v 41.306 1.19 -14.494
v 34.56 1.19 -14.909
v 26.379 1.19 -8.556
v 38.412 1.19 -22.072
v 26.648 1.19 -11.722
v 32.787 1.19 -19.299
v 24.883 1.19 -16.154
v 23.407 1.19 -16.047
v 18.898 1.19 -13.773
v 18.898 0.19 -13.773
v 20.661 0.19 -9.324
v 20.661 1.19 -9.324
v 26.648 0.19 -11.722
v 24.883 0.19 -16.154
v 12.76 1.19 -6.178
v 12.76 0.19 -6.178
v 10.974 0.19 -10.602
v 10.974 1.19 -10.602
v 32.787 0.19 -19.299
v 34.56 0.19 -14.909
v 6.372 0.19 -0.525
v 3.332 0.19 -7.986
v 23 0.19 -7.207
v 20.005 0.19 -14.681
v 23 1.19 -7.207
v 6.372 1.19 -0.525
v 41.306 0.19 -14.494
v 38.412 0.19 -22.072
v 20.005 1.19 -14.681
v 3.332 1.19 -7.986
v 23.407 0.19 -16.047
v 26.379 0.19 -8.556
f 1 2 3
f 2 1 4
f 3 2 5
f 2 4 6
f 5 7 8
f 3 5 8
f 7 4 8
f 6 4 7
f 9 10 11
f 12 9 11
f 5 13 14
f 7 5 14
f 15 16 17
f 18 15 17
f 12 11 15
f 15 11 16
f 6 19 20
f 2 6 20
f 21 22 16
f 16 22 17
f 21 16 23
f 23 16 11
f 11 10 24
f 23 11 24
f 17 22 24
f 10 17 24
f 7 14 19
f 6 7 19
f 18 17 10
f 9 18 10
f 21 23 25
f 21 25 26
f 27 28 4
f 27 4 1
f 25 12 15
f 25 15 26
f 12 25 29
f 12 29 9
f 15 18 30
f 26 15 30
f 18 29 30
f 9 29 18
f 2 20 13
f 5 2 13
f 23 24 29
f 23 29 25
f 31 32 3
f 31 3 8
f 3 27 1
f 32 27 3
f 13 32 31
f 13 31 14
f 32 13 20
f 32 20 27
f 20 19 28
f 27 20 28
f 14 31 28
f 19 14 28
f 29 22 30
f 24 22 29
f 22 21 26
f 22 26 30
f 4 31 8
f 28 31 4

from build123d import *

# Parameters (mm, degrees)
SKETCH1_R           = 1.281558591
SKETCH1_R_2         = 1.27912149
BOSS_EXTRUDE1_DEPTH = 1.19
CUT_EXTRUDE1_DEPTH  = 2.54
CUT_EXTRUDE2_DEPTH  = 9.906


with BuildPart() as part:
    # Sketch1 → Boss-Extrude1 (new body)
    with BuildSketch(Plane(origin=(0, 0, 0), x_dir=(1, 0, 0), z_dir=(0, 1, 0))):
        with BuildLine():
            Line((-3.948168159, 25.857752235), (34.708440024, 30.372559307))
            add(Edge.make_bspline(
                [(34.708440024, 30.372559307), (34.942308086, 29.862573914), (35.216465801, 29.369202379), (35.41004421, 28.842603127), (35.634944676, 28.230797202), (35.768879722, 27.589205916), (35.960617271, 26.966210393), (35.965938184, 26.948921629), (35.991057299, 26.944232956), (35.999261802, 26.928111554), (36.743885485, 25.464966639), (37.564180772, 24.036910168), (38.217825185, 22.530919978), (38.865327395, 21.039081363), (40.441376905, 16.960362547), (41.306486039, 14.494420913)],
                knots=[0, 0, 0, 0, 1, 1, 1, 2, 2, 2, 3, 3, 3, 4, 4, 4, 5, 5, 5, 5], degree=3))
            Line((41.306486039, 14.494420913), (26.379308433, 8.556241677))
            Line((26.379308433, 8.556241677), (21.571141955, 20.672821201))
            add(Edge.make_bspline(
                [(21.571141955, 20.672821201), (21.634910972, 21.018173468), (21.748594484, 21.35796102), (21.762449005, 21.708878001), (21.774151999, 22.005299603), (21.695806289, 22.298709609), (21.646885264, 22.591300552), (21.643902496, 22.609140136), (21.617478501, 22.613950002), (21.608496587, 22.629649458), (21.454882222, 22.898151457), (21.383454938, 23.23493464), (21.147653492, 23.435155456), (20.905488639, 23.64077949), (20.692579942, 23.888331524), (20.418328284, 24.048678297), (20.15986613, 24.199793417), (19.870796872, 24.315401802), (19.574055785, 24.355191149), (19.180278137, 24.407991911), (18.74328259, 24.448836406), (18.384663016, 24.277837116), (18.13147516, 24.157110455), (17.87065401, 24.052846943), (17.617466154, 23.932120282), (17.601139945, 23.924335514), (17.591549832, 23.906868519), (17.579117247, 23.893731605), (17.361458227, 23.66374179), (17.104351703, 23.465224478), (16.927205729, 23.202755302), (16.779704543, 22.984209467), (16.687302856, 22.728685321), (16.62063322, 22.473589178), (16.545622255, 22.186576842), (16.544200548, 21.885227936), (16.505984212, 21.591047315)],
                knots=[0, 0, 0, 0, 1, 1, 1, 2, 2, 2, 3, 3, 3, 4, 4, 4, 5, 5, 5, 6, 6, 6, 7, 7, 7, 8, 8, 8, 9, 9, 9, 10, 10, 10, 11, 11, 11, 12, 12, 12, 12], degree=3))
            add(Edge.make_bspline(
                [(16.505984212, 21.591047315), (16.518782353, 21.578266264), (16.539801332, 21.570202619), (16.544378636, 21.552704162), (16.617400623, 21.273550308), (16.663764579, 20.987872856), (16.736786566, 20.708719002), (16.806805853, 20.441044093), (17.044044502, 20.24849863), (17.19767347, 20.018388445), (17.465578341, 19.617112304), (18.031163484, 19.577799481), (18.234246012, 19.098229697), (19.127510948, 16.988826809), (19.346682772, 16.331345691), (20.002158395, 14.686998305), (21.518894597, 10.882064728), (22.011547535, 9.986611514), (22.99992287, 7.207084206)],
                knots=[0, 0, 0, 0, 1, 1, 1, 2, 2, 2, 3, 3, 3, 4, 4, 4, 5, 5, 5, 6, 6, 6, 6], degree=3))
            Line((22.99992287, 7.207084206), (6.371709484, 0.524718752))
            Line((6.371709484, 0.524718752), (-3.948168159, 25.857752235))
        make_face()
        with Locations(Location((31.581994118, 27.844041808, 0), (0, 0, 270))):
            Circle(SKETCH1_R, mode=Mode.SUBTRACT)
        with Locations(Location((4.443945521, 18.622159212, 0), (0, 0, 270))):
            Circle(SKETCH1_R_2, mode=Mode.SUBTRACT)
        Polygon((29.528011628, 24.668032897), (31.295389474, 20.292362952), (24.334912298, 17.497443293), (22.582661714, 21.866014987), align=None, mode=Mode.SUBTRACT)
        Polygon((16.577782643, 19.493154262), (18.362295388, 15.097963812), (11.376540447, 12.313291502), (9.611482192, 16.686576517), align=None, mode=Mode.SUBTRACT)
        Polygon((32.786623967, 19.298845197), (34.559807218, 14.90935059), (26.647925888, 11.722355727), (24.882600183, 16.153609635), align=None, mode=Mode.SUBTRACT)
        Polygon((18.898363139, 13.77263465), (20.661300607, 9.324417197), (12.759882633, 6.178035225), (10.974286829, 10.601867258), align=None, mode=Mode.SUBTRACT)
    extrude(amount=BOSS_EXTRUDE1_DEPTH)

    # Sketch2 → Cut-Extrude1 (cut)
    with BuildSketch(Plane.XZ):
        Polygon((0.587242747, -6.884275357), (39.490843961, -22.50554763), (39.490843961, -43.06449087), (-7.692806902, -25.9504125), align=None)
    extrude(amount=-CUT_EXTRUDE1_DEPTH, mode=Mode.SUBTRACT)


with BuildPart() as cut_extrude1_piece_1:
    # of the separate pieces the step leaves, piece 1, a body of its own (cut_extrude1_pieces)
    add(part.part.solids().sort_by_distance((6.371709484, 0, -0.524718752))[0])


with BuildPart() as cut_extrude1_piece_2:
    # of the separate pieces the step leaves, piece 2, a body of its own (cut_extrude1_pieces)
    add(part.part.solids().sort_by_distance((38.41229244, 0, -22.072468263))[0])


with BuildPart() as cut_extrude2_tool:
    # Sketch4 → Cut-Extrude2 (new body)
    with BuildSketch(Plane(origin=(-2.298949217, 0, -5.725359753), x_dir=(-0.9279837403895839, 0, 0.37262068859975767), z_dir=(-0.37262068859975767, 0, -0.9279837403895839))):
        Polygon((-6.067991774, 0.19), (-45.594810032, 0.19), (-45.594810032, -0.619411818), (-5.559501148, -0.619411818), align=None)
    extrude(amount=-CUT_EXTRUDE2_DEPTH)


with BuildPart() as cut_extrude1_piece_1_1:
    add(cut_extrude1_piece_1.part)

    # Cut-Extrude2: cut by cut_extrude2_tool
    add(cut_extrude2_tool.part, mode=Mode.SUBTRACT)


with BuildPart() as cut_extrude1_piece_2_1:
    add(cut_extrude1_piece_2.part)

    # Cut-Extrude2: cut by cut_extrude2_tool
    add(cut_extrude2_tool.part, mode=Mode.SUBTRACT)


solid = Compound([cut_extrude1_piece_1_1.part, cut_extrude1_piece_2_1.part])
